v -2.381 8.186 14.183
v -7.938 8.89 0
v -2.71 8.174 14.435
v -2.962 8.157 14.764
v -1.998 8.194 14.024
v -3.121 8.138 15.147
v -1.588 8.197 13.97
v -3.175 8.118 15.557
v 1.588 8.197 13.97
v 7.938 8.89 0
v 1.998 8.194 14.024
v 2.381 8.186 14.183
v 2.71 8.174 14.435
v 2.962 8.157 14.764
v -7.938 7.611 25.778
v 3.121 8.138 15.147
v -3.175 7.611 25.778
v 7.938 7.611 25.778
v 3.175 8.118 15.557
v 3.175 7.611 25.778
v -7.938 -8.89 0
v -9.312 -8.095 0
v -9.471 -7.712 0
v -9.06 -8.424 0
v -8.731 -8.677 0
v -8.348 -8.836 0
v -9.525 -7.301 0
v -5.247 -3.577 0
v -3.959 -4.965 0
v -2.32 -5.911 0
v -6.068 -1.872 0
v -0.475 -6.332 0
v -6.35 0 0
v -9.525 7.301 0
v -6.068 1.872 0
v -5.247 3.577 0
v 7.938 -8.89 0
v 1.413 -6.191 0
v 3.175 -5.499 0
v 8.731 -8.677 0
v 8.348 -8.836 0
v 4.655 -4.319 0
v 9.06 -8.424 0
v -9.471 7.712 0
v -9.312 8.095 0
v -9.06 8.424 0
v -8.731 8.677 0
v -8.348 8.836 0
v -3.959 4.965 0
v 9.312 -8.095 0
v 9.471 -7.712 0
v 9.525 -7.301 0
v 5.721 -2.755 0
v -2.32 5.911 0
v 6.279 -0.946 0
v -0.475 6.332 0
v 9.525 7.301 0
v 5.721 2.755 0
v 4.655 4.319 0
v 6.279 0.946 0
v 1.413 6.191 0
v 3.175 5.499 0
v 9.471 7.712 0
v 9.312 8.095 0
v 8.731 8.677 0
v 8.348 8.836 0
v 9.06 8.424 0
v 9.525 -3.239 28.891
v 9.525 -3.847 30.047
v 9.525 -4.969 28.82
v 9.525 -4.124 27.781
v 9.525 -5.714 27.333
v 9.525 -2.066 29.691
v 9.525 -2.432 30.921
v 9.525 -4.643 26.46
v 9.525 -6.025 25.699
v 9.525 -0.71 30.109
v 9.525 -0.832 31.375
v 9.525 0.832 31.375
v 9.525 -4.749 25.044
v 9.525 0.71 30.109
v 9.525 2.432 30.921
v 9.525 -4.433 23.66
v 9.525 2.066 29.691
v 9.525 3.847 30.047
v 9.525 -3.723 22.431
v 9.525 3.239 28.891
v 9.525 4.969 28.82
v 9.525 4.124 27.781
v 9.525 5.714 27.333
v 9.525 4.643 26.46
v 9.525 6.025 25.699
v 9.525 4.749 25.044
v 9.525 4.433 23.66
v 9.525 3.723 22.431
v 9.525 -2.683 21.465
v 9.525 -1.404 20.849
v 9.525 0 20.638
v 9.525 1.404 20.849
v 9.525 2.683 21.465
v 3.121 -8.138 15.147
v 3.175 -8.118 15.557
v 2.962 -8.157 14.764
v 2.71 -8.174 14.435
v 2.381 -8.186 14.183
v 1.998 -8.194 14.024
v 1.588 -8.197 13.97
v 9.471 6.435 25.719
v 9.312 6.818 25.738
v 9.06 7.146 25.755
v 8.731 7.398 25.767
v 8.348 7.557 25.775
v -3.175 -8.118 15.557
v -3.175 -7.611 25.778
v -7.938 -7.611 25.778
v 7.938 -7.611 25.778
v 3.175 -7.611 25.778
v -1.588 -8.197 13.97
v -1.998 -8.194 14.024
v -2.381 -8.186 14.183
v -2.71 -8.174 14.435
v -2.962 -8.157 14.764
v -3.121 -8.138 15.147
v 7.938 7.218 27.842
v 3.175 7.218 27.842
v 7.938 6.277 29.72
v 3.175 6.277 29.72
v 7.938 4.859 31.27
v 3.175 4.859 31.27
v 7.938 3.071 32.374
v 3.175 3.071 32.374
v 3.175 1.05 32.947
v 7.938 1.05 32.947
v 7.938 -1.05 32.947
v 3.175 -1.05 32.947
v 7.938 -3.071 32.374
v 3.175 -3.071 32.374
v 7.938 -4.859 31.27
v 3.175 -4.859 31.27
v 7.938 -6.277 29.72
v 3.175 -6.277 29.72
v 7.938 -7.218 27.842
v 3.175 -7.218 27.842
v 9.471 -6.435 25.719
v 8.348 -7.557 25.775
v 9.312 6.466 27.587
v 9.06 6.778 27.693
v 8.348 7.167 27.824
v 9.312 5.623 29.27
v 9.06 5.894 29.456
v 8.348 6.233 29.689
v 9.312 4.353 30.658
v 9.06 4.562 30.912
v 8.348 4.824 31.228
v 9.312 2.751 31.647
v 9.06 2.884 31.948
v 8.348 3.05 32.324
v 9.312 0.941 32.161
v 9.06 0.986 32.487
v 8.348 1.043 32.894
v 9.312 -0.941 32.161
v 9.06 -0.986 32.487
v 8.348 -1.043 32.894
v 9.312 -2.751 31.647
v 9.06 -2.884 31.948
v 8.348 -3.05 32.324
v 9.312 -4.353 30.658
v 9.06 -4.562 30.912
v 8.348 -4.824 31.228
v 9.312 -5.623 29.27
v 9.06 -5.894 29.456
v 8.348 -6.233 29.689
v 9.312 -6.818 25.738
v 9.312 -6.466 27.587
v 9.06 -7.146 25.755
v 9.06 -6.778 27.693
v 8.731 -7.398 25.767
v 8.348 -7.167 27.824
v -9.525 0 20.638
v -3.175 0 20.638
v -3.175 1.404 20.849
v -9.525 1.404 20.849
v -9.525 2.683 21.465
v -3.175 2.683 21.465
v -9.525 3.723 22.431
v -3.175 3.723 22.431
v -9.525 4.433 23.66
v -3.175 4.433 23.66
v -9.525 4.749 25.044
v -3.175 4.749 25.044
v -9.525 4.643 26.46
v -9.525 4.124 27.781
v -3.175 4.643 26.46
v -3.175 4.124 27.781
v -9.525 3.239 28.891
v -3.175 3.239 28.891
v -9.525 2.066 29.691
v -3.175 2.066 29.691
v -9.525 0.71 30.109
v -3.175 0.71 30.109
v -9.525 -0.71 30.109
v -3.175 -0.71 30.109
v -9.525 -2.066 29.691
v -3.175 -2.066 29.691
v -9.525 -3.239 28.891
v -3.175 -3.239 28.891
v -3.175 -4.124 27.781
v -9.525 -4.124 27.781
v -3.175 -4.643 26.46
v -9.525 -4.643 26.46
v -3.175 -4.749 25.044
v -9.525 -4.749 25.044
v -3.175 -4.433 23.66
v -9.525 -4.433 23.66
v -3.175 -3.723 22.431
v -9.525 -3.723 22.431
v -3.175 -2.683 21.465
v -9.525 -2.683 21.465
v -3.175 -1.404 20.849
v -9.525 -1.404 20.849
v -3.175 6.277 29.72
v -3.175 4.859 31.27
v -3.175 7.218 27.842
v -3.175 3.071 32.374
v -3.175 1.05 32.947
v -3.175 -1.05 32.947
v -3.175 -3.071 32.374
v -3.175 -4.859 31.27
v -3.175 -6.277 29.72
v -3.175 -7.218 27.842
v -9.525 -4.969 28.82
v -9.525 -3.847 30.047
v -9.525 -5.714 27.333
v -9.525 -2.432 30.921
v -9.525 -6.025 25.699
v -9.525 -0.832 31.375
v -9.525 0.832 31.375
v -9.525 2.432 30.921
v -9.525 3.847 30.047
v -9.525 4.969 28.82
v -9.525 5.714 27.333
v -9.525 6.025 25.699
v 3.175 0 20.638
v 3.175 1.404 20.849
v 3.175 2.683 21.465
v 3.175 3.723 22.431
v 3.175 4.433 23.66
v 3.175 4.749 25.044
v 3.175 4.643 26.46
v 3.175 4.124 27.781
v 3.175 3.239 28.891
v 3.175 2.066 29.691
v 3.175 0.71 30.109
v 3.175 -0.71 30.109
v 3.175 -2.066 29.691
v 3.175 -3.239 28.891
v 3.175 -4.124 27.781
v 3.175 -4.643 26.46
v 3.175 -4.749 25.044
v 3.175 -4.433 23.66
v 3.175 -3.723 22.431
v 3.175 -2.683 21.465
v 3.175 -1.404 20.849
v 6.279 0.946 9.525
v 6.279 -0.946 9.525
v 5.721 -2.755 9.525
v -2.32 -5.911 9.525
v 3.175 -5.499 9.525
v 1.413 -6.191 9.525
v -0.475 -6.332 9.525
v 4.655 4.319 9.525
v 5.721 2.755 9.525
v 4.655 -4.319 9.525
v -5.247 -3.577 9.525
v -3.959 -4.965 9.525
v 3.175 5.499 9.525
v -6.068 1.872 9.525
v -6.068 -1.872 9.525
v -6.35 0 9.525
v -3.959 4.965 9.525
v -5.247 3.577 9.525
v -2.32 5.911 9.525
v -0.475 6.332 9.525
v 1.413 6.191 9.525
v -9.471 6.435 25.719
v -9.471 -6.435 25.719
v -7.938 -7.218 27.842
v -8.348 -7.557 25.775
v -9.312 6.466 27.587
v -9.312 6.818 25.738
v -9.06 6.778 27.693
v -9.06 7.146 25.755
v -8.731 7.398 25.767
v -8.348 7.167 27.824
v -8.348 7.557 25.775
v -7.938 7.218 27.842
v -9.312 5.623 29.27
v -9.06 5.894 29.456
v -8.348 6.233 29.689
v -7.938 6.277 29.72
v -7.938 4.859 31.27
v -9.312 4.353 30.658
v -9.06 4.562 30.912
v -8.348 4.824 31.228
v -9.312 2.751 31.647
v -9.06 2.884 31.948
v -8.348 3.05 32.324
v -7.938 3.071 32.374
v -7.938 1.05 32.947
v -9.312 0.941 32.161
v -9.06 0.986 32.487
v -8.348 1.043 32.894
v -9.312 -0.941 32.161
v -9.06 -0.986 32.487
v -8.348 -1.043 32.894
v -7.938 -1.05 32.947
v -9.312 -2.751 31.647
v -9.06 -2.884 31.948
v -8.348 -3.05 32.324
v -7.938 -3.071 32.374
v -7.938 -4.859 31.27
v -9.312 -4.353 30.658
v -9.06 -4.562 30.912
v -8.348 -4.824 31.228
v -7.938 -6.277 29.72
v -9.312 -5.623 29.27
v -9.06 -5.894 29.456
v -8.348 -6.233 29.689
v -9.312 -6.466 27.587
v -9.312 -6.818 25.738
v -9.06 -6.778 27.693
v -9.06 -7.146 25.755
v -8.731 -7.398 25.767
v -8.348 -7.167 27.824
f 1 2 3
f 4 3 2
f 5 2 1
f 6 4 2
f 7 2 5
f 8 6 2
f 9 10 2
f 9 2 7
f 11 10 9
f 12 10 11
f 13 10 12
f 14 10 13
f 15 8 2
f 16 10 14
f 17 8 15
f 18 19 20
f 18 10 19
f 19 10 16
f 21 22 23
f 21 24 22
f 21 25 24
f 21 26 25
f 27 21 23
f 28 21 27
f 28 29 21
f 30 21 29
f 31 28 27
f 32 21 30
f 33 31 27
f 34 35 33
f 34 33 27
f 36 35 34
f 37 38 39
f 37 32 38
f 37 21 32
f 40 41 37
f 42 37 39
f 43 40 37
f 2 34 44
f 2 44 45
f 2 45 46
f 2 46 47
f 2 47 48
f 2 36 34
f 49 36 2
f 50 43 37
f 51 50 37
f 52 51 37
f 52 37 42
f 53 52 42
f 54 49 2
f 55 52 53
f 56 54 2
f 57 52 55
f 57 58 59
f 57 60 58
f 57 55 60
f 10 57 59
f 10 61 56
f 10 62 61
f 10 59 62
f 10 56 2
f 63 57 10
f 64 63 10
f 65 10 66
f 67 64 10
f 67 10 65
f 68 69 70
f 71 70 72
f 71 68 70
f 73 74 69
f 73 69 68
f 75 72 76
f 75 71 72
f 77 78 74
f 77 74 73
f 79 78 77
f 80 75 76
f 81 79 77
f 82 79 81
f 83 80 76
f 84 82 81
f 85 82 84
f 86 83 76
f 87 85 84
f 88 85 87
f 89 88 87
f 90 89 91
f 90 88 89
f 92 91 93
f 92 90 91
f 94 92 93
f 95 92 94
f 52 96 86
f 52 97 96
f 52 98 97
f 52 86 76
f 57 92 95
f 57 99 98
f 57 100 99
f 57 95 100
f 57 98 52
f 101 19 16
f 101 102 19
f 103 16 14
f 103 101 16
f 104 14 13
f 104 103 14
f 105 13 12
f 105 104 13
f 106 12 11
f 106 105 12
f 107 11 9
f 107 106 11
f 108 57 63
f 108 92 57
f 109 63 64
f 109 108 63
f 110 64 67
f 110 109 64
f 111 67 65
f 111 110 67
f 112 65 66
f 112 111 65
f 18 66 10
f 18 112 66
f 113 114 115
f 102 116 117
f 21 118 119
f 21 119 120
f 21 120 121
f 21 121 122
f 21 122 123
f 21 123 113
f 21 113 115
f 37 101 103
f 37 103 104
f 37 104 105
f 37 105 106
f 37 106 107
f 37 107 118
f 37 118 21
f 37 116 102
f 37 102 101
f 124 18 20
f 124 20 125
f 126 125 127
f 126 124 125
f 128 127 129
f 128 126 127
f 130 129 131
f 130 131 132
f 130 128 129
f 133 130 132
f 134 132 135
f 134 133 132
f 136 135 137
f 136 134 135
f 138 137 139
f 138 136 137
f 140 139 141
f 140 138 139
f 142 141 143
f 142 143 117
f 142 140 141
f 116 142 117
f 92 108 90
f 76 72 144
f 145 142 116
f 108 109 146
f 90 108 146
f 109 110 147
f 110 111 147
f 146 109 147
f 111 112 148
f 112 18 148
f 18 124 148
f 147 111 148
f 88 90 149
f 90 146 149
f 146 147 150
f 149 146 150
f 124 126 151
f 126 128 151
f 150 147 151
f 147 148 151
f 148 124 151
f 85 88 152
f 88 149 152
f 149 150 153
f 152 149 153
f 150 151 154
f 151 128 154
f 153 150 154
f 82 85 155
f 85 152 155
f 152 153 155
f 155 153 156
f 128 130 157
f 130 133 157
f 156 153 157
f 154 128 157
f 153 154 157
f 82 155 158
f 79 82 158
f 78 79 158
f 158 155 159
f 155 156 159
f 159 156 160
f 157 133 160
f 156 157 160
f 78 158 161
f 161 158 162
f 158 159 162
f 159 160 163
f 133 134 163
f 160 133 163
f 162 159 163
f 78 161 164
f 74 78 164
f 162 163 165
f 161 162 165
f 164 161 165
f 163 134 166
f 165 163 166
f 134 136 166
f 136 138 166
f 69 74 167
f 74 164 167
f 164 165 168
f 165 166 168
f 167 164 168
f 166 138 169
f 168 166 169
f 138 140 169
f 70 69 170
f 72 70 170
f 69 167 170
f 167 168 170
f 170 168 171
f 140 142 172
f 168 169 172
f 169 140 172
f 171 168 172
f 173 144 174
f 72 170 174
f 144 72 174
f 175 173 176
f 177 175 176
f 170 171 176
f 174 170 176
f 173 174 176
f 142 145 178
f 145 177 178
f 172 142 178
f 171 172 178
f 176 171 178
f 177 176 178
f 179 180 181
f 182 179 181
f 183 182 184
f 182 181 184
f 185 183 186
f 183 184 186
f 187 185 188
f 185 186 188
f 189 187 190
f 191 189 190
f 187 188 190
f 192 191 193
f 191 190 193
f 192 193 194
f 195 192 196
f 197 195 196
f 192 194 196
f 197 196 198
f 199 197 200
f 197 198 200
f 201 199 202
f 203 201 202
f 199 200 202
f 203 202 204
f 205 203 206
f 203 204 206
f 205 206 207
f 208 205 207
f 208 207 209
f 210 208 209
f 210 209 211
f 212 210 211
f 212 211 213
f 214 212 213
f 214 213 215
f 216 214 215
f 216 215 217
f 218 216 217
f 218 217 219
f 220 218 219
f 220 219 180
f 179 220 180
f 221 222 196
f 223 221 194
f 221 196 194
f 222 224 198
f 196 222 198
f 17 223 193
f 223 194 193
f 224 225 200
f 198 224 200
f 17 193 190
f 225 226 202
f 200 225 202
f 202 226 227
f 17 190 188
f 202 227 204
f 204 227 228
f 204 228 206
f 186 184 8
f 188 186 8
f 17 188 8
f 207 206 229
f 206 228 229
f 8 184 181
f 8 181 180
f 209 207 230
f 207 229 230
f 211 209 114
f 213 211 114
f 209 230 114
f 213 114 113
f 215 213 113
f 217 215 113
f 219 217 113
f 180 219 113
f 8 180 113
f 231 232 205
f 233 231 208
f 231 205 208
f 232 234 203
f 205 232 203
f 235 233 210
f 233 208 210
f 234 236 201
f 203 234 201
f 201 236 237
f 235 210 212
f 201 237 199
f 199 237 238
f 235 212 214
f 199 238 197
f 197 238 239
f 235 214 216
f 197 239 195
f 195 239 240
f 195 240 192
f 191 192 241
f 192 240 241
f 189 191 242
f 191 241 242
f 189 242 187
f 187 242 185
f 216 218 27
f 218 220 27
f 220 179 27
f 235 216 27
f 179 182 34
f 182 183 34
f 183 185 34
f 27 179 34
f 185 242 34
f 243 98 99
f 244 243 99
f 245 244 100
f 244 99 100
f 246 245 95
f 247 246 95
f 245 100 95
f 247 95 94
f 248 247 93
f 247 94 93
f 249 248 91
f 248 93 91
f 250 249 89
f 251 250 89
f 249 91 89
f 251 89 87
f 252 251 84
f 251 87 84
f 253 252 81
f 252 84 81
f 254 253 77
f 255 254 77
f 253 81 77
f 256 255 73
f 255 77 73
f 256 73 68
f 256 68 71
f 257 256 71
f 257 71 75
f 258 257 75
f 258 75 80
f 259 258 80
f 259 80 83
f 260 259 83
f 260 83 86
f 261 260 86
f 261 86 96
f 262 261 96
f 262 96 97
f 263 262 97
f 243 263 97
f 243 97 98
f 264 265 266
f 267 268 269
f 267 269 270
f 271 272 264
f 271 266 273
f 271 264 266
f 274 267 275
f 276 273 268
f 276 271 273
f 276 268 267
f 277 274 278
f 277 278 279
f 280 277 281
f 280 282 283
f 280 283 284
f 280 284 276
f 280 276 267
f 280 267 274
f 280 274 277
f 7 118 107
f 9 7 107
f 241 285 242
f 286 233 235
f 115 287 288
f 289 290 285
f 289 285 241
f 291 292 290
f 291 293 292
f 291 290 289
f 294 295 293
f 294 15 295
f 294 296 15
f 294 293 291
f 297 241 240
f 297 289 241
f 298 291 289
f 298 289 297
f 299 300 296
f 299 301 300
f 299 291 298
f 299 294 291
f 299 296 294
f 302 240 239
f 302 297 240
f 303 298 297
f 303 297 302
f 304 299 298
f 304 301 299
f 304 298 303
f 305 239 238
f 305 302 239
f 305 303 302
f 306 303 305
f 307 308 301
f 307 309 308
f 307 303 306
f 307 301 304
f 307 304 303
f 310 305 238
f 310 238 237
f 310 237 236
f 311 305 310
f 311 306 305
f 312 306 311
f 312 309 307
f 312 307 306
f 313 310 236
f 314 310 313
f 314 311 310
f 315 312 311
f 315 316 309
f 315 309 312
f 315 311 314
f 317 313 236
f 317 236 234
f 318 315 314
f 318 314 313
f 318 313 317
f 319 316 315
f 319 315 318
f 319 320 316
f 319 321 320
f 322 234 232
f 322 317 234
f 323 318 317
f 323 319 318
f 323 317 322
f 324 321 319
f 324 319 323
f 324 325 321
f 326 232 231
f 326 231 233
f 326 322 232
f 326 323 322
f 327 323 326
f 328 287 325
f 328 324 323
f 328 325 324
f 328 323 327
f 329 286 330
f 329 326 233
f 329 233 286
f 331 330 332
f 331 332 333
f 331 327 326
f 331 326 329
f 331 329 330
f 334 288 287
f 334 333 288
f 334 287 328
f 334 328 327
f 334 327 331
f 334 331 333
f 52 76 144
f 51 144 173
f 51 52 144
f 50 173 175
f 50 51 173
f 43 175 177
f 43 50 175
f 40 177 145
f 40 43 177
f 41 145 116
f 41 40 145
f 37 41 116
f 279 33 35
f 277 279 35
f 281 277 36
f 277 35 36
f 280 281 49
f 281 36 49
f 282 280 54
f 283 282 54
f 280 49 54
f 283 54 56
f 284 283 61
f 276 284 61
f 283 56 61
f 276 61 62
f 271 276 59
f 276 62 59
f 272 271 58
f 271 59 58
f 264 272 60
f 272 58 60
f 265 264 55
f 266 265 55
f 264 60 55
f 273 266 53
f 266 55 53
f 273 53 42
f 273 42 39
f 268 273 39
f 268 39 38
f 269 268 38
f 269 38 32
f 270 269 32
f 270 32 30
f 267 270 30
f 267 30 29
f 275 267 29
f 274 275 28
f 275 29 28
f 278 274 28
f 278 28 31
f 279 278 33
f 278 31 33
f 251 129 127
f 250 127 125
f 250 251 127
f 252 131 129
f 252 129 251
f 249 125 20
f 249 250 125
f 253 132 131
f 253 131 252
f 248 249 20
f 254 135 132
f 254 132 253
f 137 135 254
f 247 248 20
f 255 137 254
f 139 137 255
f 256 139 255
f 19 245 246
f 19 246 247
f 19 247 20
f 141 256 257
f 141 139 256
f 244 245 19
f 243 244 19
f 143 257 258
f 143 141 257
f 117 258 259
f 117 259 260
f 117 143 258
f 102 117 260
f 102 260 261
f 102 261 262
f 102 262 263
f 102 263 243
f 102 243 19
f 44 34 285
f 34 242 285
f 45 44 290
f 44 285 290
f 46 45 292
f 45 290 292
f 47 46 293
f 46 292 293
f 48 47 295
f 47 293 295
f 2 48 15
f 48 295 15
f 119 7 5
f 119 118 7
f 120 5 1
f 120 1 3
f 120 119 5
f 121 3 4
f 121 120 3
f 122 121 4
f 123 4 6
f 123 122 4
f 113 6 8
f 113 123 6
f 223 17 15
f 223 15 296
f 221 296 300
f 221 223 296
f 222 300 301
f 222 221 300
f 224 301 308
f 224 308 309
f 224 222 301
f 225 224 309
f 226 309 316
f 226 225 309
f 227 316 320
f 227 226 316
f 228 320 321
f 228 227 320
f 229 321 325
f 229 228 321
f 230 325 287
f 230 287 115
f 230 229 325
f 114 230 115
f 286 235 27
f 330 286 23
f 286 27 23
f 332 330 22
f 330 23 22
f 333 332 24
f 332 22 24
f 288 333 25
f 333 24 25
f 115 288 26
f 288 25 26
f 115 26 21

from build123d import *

# Parameters (mm, degrees)
EXTRUDE2_DEPTH          = 9.525
SKETCH3_W               = 6.35
SKETCH3_H               = 19.05
CUT_EXTRUDE1_DEPTH      = 9.89
CUT_EXTRUDE1_DEPTH_BACK = 9.89
SKETCH4_R               = 4.7625
CUT_EXTRUDE2_DEPTH      = 20.05
SKETCH5_R               = 6.35
CUT_EXTRUDE3_DEPTH      = 9.525
FILLET1_R               = 1.5875


with BuildPart() as part:
    # Sketch2 → Extrude2 (new body, symmetric)
    with BuildSketch(Plane(origin=(0, 0, 0), x_dir=(0, 0, -1), z_dir=(1, 0, 0))):
        with BuildLine():
            Line((0, 8.89), (-25.777721364, 7.610632469))
            ThreePointArc((-25.777721364, 7.610632469), (-33.02, 0), (-25.777721364, -7.610632469))
            Line((-25.777721364, -7.610632469), (0, -8.89))
            Line((0, -8.89), (0, 8.89))
        make_face()
    extrude(amount=EXTRUDE2_DEPTH, both=True)

    # Sketch3 → Cut-Extrude1 (cut, two sides)
    with BuildSketch(Plane(origin=(0, 0, 0), x_dir=(1, 0, 0), z_dir=(0, 1, 0))) as cut_extrude1_sk:
        with Locations((0, -23.495)):
            Rectangle(SKETCH3_W, SKETCH3_H)
    extrude(amount=CUT_EXTRUDE1_DEPTH, mode=Mode.SUBTRACT)
    extrude(cut_extrude1_sk.sketch, amount=-CUT_EXTRUDE1_DEPTH_BACK, mode=Mode.SUBTRACT)

    # Sketch4 → Cut-Extrude2 (cut, through all)
    with BuildSketch(Plane(origin=(9.525, 0, 0), x_dir=(0, 0, -1), z_dir=(1, 0, 0))):
        with Locations((-25.4, 0)):
            Circle(SKETCH4_R)
    extrude(amount=-CUT_EXTRUDE2_DEPTH, mode=Mode.SUBTRACT)

    # Sketch5 → Cut-Extrude3 (cut)
    with BuildSketch(Plane(origin=(0, 0, 0), x_dir=(-1, 0, 0), z_dir=(0, 0, -1))):
        Circle(SKETCH5_R)
    extrude(amount=-CUT_EXTRUDE3_DEPTH, mode=Mode.SUBTRACT)

    # Fillet1
    fillet1_edges = [part.edges().sort_by_distance(p)[0] for p in [
        (9.525, 0, 33.02),
        (9.525, -8.250316234, 12.888860682),
        (-3.175, 0, 13.97),
        (3.175, 0, 13.97),
        (-9.525, -8.250316234, 12.888860682),
        (-9.525, 0, 33.02),
        (-9.525, 8.250316234, 12.888860682),
        (9.525, 8.250316234, 12.888860682),
    ]]
    fillet(fillet1_edges, radius=FILLET1_R)


solid = part.part
